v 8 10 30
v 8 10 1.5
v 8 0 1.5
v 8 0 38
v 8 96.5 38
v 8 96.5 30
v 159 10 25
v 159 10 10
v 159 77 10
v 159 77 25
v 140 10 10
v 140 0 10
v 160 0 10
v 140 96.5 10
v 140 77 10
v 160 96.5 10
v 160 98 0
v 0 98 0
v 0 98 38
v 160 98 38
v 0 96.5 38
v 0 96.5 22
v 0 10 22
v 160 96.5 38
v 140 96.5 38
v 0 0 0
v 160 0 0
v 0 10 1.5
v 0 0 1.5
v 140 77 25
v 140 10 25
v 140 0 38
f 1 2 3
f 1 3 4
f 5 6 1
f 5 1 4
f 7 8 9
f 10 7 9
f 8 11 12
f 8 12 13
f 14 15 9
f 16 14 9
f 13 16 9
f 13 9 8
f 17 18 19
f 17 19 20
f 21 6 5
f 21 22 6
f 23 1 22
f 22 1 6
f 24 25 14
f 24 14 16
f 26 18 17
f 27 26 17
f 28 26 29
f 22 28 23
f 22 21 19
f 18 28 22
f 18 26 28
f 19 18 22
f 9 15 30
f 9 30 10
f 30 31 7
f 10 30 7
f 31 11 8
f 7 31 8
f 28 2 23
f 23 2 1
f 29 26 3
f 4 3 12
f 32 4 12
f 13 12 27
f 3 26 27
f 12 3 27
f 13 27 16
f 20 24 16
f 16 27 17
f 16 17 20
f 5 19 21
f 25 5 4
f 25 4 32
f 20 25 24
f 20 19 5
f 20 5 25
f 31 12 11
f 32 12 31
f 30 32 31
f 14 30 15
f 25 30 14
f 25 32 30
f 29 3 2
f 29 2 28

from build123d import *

# Parameters (mm, degrees)
SKETCH_1_W          = 160
SKETCH_1_H          = 98
EXTRUDE_1_DEPTH     = 38
SKETCH_2_W          = 20
SKETCH_2_H          = 96.5
CUT_EXTRUDE_1_DEPTH = 28
SKETCH_3_W          = 19
SKETCH_3_H          = 67
EXTRUDE_2_DEPTH     = 15
SKETCH_4_W          = 16
SKETCH_4_H          = 96.5
CUT_EXTRUDE_2_DEPTH = 8
CHAMFER_1_SIZE      = 8
CUT_EXTRUDE_3_DEPTH = 10


with BuildPart() as part:
    # 草图1 → 凸台-拉伸1 (new body)
    with BuildSketch(Plane.XY):
        with Locations((80, 49)):
            Rectangle(SKETCH_1_W, SKETCH_1_H)
    extrude(amount=EXTRUDE_1_DEPTH)

    # 草图2 → 切除-拉伸1 (cut)
    with BuildSketch(Plane.XY.offset(38)):
        with Locations((150, 48.25)):
            Rectangle(SKETCH_2_W, SKETCH_2_H)
    extrude(amount=-CUT_EXTRUDE_1_DEPTH, mode=Mode.SUBTRACT)

    # 草图3 → 凸台-拉伸2 (add)
    with BuildSketch(Plane.XY.offset(10)):
        with Locations((149.5, 43.5)):
            Rectangle(SKETCH_3_W, SKETCH_3_H)
    extrude(amount=EXTRUDE_2_DEPTH)

    # 草图4 → 切除-拉伸2 (cut)
    with BuildSketch(Plane.ZY):
        with Locations((30, 48.25)):
            Rectangle(SKETCH_4_W, SKETCH_4_H)
    extrude(amount=-CUT_EXTRUDE_2_DEPTH, mode=Mode.SUBTRACT)

    # 倒角1
    chamfer_1_edges = [part.edges().sort_by_distance(p)[0] for p in [
        (8, 48.25, 22),
    ]]
    chamfer(chamfer_1_edges, length=CHAMFER_1_SIZE - 0.0001)  # a hair under: the kernel refuses the full size

    # 草图5 → 切除-拉伸3 (cut)
    with BuildSketch(Plane.XZ):
        Polygon((0, 22), (8, 30), (8, 1.5), (0, 1.5), align=None)
    extrude(amount=-CUT_EXTRUDE_3_DEPTH, mode=Mode.SUBTRACT)


solid = part.part
